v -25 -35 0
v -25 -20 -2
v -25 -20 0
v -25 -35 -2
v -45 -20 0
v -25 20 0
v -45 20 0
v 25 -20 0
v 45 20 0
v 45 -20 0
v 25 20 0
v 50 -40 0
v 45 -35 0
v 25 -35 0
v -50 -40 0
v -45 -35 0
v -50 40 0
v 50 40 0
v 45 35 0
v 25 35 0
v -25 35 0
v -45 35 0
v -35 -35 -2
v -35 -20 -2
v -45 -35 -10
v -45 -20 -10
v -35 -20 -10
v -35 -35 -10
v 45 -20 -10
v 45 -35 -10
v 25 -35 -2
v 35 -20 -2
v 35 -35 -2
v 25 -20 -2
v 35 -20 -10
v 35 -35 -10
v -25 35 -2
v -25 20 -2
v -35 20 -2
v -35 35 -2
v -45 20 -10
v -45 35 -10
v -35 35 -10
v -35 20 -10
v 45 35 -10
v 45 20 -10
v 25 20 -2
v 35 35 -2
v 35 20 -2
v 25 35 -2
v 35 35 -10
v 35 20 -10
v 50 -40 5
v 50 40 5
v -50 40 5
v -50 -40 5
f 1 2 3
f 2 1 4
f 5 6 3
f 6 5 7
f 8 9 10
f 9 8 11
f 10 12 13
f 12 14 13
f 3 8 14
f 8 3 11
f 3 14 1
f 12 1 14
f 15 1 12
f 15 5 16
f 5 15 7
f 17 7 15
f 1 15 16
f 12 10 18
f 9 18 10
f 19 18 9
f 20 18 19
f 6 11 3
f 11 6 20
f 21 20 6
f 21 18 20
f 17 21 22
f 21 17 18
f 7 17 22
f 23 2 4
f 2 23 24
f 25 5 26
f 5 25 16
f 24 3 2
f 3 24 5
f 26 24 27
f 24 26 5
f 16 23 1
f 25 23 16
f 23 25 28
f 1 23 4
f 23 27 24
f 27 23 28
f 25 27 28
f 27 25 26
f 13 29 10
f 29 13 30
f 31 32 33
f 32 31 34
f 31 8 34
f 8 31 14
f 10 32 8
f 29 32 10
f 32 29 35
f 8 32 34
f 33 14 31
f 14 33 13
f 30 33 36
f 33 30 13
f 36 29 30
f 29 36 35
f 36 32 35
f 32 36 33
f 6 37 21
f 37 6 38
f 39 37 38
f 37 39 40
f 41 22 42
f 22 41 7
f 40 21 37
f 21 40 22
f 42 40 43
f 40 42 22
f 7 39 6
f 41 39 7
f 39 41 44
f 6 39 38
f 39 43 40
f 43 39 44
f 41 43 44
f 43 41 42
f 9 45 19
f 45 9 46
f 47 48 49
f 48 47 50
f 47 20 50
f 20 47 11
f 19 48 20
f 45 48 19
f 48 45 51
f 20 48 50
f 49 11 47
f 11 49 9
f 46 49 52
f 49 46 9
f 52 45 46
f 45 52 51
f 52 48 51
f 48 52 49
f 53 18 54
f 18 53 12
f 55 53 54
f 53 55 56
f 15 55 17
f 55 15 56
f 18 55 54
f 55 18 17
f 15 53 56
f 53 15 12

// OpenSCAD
// ==============================================
// PARAMETERS (All dimensions in millimeters)
// ==============================================
// Main slab dimensions
slab_width = 100;       // X-axis length of main top slab
slab_depth = 80;        // Y-axis length of main top slab
slab_thickness = 5;     // Z-axis height of main top slab

// Pad positioning
pad_edge_margin = 5;    // Distance from slab edge to outer edge of shallow pads

// Upper tier (shallow) pad dimensions
shallow_pad_width = 20;   // X-axis width of shallow upper pad tier
shallow_pad_depth = 15;   // Y-axis depth of shallow upper pad tier
shallow_pad_thickness = 2;// Z-axis height of shallow upper pad tier

// Lower tier (deep) pad dimensions
deep_pad_width = 10;      // X-axis width of deep lower pad tier (must be < shallow_pad_width)
deep_pad_thickness = 8;   // Z-axis height of deep lower pad tier
deep_pad_depth = shallow_pad_depth; // Matches shallow pad depth to align front/back edges

// Global resolution setting
$fn = 64;

// ==============================================
// MODULE DEFINITIONS
// ==============================================
/**
 * Two-tier underside pad: shallow upper tier attached to slab, deeper lower tier
 * aligned to either left or right edge of the shallow tier, matching front/back edges
 * @param align_deep_left: If true, deep pad aligns to left edge of shallow pad, else right edge
 * Origin is at top center of the shallow pad (attachment point to slab underside)
 */
module two_tier_pad(align_deep_left = true) {
    // Upper shallow pad tier (attaches directly to slab underside)
    translate([0, 0, -shallow_pad_thickness/2])
    cube([shallow_pad_width, shallow_pad_depth, shallow_pad_thickness], center=true);

    // Calculate X offset for deep pad alignment
    deep_pad_x_offset = align_deep_left ? 
        (-shallow_pad_width/2 + deep_pad_width/2) :  // Align left edge
        (shallow_pad_width/2 - deep_pad_width/2);    // Align right edge

    // Lower deep pad tier (attached to bottom of shallow pad)
    translate([deep_pad_x_offset, 0, -(shallow_pad_thickness + deep_pad_thickness/2)])
    cube([deep_pad_width, deep_pad_depth, deep_pad_thickness], center=true);
}

// ==============================================
// MAIN MODEL ASSEMBLY
// ==============================================
union() {
    // Main top slab (centered on X/Y axis, bottom surface at Z=0)
    translate([-slab_width/2, -slab_depth/2, 0])
    cube([slab_width, slab_depth, slab_thickness]);

    // --------------------------
    // Four underside two-tier pads
    // --------------------------
    // Front left pad (deep pad aligned left)
    translate([
        -slab_width/2 + pad_edge_margin + shallow_pad_width/2,
        -slab_depth/2 + pad_edge_margin + shallow_pad_depth/2,
        0
    ])
    two_tier_pad(align_deep_left=true);

    // Front right pad (deep pad aligned right)
    translate([
        slab_width/2 - pad_edge_margin - shallow_pad_width/2,
        -slab_depth/2 + pad_edge_margin + shallow_pad_depth/2,
        0
    ])
    two_tier_pad(align_deep_left=false);

    // Back left pad (deep pad aligned left)
    translate([
        -slab_width/2 + pad_edge_margin + shallow_pad_width/2,
        slab_depth/2 - pad_edge_margin - shallow_pad_depth/2,
        0
    ])
    two_tier_pad(align_deep_left=true);

    // Back right pad (deep pad aligned right)
    translate([
        slab_width/2 - pad_edge_margin - shallow_pad_width/2,
        slab_depth/2 - pad_edge_margin - shallow_pad_depth/2,
        0
    ])
    two_tier_pad(align_deep_left=false);
}
